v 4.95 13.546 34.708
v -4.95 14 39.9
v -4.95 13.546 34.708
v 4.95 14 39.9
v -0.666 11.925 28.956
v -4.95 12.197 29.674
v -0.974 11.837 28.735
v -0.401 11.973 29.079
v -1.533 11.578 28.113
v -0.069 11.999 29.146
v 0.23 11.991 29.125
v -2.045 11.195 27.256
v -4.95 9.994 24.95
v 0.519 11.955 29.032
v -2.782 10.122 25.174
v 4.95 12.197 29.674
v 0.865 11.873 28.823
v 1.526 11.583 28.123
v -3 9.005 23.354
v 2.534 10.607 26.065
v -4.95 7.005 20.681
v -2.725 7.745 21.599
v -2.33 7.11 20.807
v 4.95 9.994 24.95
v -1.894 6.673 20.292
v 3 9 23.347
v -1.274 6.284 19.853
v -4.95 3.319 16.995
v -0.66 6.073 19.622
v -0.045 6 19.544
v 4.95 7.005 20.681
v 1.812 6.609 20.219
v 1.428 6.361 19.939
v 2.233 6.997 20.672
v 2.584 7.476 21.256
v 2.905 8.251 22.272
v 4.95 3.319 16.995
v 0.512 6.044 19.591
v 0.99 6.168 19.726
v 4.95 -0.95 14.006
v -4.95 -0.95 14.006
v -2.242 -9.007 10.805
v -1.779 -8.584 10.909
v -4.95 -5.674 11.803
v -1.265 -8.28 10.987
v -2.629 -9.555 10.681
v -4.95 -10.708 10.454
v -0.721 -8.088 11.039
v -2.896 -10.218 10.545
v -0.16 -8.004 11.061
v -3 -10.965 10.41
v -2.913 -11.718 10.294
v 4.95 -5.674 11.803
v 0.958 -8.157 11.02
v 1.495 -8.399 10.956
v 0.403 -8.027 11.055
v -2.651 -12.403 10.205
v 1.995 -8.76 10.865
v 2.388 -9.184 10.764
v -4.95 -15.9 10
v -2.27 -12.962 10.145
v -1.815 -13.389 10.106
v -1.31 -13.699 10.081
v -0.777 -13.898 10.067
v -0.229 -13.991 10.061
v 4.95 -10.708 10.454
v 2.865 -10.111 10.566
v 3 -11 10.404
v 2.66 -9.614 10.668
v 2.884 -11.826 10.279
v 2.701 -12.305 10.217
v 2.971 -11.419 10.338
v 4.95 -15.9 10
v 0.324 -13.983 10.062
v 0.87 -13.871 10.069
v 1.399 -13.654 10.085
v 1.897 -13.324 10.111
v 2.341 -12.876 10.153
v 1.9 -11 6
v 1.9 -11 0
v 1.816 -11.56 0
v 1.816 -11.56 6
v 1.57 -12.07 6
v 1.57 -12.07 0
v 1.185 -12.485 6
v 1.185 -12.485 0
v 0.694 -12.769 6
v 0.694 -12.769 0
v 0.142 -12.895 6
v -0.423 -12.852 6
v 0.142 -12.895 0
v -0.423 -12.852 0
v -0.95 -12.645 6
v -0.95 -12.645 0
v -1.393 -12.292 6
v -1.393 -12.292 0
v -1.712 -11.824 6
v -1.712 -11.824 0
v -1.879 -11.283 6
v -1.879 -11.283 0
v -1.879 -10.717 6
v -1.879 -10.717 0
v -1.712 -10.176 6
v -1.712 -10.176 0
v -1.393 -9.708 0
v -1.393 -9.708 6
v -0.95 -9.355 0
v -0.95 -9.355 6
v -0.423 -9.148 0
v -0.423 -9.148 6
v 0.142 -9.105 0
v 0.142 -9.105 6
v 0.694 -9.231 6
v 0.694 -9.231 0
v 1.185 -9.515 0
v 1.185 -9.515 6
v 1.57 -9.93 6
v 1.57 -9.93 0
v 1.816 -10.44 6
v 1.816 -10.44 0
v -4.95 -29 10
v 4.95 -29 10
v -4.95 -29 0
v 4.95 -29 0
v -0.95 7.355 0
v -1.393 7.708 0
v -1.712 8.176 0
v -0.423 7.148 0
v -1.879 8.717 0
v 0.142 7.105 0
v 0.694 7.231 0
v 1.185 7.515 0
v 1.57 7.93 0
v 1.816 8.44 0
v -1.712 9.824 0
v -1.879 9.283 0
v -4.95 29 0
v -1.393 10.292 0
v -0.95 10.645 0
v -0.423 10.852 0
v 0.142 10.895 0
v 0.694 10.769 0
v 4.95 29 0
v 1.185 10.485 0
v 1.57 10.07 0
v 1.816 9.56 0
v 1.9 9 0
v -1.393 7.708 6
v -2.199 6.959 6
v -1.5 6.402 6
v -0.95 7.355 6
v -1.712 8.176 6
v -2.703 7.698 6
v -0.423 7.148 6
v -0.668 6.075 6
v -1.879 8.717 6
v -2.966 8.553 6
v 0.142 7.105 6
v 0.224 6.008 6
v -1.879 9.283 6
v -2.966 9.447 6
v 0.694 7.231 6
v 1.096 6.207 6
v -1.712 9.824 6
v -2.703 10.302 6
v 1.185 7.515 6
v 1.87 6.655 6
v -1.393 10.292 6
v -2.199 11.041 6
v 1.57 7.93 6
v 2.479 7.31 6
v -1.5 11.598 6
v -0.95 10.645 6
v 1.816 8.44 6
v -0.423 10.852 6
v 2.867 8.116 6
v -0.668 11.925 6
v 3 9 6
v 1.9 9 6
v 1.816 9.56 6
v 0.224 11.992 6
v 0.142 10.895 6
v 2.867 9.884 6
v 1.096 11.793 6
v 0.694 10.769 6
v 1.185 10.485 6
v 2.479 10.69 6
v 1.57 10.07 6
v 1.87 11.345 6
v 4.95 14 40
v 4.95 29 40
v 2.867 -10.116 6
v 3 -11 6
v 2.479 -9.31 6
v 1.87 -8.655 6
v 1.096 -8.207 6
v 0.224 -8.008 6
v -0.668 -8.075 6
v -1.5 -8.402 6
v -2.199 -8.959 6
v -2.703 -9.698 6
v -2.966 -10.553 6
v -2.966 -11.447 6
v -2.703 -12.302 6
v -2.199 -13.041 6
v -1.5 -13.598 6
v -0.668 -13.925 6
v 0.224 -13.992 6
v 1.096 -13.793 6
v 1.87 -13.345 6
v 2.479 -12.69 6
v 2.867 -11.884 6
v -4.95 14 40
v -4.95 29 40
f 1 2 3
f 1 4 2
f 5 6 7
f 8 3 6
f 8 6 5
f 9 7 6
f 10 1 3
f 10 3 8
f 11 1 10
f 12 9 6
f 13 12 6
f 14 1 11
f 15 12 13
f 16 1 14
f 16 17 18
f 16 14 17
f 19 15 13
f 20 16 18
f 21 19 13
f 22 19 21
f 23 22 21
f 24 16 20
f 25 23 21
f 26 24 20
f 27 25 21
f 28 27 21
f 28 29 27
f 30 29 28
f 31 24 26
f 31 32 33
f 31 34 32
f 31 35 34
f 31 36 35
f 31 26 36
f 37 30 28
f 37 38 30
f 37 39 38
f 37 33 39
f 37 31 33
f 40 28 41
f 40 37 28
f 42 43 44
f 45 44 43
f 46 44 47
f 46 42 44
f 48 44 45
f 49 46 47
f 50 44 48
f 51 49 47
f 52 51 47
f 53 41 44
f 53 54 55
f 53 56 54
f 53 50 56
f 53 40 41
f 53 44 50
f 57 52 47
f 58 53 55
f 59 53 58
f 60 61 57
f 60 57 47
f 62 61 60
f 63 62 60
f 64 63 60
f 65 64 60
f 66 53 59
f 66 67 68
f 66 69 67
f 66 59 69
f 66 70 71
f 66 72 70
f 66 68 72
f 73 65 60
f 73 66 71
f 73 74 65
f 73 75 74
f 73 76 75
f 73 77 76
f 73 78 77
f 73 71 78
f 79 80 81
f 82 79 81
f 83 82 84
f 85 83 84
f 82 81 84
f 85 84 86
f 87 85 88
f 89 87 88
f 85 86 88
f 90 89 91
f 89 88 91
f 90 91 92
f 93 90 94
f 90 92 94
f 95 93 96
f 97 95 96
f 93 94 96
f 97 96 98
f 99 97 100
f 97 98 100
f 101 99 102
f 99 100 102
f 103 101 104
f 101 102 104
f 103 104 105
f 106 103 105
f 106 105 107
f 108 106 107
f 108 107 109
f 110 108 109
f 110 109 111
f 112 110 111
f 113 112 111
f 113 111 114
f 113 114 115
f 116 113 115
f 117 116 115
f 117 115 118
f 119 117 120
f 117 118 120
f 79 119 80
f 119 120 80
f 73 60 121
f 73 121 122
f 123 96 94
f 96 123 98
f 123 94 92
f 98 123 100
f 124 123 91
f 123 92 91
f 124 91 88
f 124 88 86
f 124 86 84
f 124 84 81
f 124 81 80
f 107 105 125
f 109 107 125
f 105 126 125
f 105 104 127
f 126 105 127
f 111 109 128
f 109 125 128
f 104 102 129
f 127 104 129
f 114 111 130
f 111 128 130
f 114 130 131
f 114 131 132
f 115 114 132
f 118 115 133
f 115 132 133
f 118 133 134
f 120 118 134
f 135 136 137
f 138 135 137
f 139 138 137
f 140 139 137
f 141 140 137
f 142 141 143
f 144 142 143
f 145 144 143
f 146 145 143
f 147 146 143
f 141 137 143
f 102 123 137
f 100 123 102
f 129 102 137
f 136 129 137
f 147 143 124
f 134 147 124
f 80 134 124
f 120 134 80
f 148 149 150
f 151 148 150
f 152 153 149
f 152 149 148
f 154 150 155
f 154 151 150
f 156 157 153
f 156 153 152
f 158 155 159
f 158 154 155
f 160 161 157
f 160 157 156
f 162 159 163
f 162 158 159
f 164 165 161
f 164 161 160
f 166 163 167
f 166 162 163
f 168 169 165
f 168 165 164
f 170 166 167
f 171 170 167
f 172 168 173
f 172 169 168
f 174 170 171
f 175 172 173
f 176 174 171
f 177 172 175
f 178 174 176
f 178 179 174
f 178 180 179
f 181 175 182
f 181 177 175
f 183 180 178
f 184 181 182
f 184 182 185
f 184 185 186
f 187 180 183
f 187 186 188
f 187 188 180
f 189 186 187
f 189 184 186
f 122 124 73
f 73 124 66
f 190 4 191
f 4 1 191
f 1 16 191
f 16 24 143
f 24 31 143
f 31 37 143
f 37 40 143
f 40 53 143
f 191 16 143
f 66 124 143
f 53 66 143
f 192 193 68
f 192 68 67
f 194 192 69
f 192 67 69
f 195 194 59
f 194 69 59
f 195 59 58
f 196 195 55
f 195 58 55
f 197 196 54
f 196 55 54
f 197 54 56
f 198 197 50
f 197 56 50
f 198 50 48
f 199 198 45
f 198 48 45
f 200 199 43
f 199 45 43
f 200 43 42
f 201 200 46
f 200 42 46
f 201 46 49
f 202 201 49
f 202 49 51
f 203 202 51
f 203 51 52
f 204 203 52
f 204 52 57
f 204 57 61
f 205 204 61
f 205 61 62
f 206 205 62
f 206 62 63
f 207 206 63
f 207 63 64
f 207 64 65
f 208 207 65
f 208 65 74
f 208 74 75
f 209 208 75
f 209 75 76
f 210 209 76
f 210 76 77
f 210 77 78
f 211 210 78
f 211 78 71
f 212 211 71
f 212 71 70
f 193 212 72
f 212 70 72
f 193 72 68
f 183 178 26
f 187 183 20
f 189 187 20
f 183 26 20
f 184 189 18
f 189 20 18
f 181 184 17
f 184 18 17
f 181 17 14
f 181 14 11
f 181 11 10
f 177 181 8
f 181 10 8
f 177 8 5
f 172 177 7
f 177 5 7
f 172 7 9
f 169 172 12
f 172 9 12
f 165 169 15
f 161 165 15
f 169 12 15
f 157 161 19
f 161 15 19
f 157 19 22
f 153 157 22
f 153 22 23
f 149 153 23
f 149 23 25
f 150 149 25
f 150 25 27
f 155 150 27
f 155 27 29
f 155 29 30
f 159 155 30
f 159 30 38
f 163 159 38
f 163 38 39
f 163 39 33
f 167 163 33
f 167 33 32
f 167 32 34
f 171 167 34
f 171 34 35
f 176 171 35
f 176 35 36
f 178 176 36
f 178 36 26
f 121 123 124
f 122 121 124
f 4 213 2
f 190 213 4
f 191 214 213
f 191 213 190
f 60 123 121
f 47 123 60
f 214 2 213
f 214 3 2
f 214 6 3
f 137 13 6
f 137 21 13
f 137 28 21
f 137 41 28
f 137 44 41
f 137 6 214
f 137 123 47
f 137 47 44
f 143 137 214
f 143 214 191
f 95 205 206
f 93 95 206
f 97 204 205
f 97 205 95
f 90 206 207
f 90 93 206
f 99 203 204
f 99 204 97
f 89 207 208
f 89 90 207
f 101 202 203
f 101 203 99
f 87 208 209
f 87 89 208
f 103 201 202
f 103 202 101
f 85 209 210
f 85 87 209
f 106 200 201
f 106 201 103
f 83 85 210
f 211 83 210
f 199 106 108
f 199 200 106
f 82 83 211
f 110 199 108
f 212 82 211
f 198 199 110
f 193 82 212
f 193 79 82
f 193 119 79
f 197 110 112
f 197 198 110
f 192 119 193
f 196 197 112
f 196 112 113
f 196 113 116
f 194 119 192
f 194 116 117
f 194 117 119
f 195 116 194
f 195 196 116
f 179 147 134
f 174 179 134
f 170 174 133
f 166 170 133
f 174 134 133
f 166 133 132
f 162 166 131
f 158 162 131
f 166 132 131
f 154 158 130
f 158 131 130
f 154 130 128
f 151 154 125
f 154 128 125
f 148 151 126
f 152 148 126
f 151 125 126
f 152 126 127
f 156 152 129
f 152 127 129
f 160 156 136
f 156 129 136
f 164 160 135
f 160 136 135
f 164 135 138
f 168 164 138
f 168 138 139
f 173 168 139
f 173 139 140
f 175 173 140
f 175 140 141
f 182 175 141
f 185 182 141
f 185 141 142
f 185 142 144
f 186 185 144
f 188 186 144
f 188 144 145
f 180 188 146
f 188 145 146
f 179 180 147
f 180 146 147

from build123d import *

# Parameters (mm, degrees)
SKETCH_W        = 9.9
SKETCH_H        = 58
PAD_DEPTH       = 40
SKETCH001_W     = 9.9
SKETCH001_H     = 43
POCKET_DEPTH    = 30
FILLET_R        = 29.9
SKETCH002_R     = 3
POCKET001_DEPTH = 34
SKETCH003_R     = 1.9
POCKET002_DEPTH = 6


with BuildPart() as part:
    # Sketch → Pad (new body)
    with BuildSketch(Plane.XY):
        Rectangle(SKETCH_W, SKETCH_H)
    extrude(amount=PAD_DEPTH)

    # Sketch001 (on Face6 of Pad) → Pocket (cut)
    with BuildSketch(Plane.XY.offset(40)):
        with Locations((0, -7.5)):
            Rectangle(SKETCH001_W, SKETCH001_H)
    extrude(amount=-POCKET_DEPTH, mode=Mode.SUBTRACT)

    # Fillet
    fillet_edges = [part.edges().sort_by_distance(p)[0] for p in [
        (0, 14, 10),
    ]]
    fillet(fillet_edges, radius=FILLET_R)

    # Sketch002 (on Face4 of Fillet) → Pocket001 (cut)
    with BuildSketch(Plane.XY.offset(40)):
        with Locations((0, 9)):
            Circle(SKETCH002_R)
        with Locations((0, -11)):
            Circle(SKETCH002_R)
    extrude(amount=-POCKET001_DEPTH, mode=Mode.SUBTRACT)

    # Sketch003 (on Face8 of Pocket001) → Pocket002 (cut)
    with BuildSketch(Plane(origin=(0, 0, 0), x_dir=(1, 0, 0), z_dir=(0, 0, -1))):
        with Locations((0, -9)):
            Circle(SKETCH003_R)
        with Locations((0, 11)):
            Circle(SKETCH003_R)
    extrude(amount=-POCKET002_DEPTH, mode=Mode.SUBTRACT)


solid = part.part
